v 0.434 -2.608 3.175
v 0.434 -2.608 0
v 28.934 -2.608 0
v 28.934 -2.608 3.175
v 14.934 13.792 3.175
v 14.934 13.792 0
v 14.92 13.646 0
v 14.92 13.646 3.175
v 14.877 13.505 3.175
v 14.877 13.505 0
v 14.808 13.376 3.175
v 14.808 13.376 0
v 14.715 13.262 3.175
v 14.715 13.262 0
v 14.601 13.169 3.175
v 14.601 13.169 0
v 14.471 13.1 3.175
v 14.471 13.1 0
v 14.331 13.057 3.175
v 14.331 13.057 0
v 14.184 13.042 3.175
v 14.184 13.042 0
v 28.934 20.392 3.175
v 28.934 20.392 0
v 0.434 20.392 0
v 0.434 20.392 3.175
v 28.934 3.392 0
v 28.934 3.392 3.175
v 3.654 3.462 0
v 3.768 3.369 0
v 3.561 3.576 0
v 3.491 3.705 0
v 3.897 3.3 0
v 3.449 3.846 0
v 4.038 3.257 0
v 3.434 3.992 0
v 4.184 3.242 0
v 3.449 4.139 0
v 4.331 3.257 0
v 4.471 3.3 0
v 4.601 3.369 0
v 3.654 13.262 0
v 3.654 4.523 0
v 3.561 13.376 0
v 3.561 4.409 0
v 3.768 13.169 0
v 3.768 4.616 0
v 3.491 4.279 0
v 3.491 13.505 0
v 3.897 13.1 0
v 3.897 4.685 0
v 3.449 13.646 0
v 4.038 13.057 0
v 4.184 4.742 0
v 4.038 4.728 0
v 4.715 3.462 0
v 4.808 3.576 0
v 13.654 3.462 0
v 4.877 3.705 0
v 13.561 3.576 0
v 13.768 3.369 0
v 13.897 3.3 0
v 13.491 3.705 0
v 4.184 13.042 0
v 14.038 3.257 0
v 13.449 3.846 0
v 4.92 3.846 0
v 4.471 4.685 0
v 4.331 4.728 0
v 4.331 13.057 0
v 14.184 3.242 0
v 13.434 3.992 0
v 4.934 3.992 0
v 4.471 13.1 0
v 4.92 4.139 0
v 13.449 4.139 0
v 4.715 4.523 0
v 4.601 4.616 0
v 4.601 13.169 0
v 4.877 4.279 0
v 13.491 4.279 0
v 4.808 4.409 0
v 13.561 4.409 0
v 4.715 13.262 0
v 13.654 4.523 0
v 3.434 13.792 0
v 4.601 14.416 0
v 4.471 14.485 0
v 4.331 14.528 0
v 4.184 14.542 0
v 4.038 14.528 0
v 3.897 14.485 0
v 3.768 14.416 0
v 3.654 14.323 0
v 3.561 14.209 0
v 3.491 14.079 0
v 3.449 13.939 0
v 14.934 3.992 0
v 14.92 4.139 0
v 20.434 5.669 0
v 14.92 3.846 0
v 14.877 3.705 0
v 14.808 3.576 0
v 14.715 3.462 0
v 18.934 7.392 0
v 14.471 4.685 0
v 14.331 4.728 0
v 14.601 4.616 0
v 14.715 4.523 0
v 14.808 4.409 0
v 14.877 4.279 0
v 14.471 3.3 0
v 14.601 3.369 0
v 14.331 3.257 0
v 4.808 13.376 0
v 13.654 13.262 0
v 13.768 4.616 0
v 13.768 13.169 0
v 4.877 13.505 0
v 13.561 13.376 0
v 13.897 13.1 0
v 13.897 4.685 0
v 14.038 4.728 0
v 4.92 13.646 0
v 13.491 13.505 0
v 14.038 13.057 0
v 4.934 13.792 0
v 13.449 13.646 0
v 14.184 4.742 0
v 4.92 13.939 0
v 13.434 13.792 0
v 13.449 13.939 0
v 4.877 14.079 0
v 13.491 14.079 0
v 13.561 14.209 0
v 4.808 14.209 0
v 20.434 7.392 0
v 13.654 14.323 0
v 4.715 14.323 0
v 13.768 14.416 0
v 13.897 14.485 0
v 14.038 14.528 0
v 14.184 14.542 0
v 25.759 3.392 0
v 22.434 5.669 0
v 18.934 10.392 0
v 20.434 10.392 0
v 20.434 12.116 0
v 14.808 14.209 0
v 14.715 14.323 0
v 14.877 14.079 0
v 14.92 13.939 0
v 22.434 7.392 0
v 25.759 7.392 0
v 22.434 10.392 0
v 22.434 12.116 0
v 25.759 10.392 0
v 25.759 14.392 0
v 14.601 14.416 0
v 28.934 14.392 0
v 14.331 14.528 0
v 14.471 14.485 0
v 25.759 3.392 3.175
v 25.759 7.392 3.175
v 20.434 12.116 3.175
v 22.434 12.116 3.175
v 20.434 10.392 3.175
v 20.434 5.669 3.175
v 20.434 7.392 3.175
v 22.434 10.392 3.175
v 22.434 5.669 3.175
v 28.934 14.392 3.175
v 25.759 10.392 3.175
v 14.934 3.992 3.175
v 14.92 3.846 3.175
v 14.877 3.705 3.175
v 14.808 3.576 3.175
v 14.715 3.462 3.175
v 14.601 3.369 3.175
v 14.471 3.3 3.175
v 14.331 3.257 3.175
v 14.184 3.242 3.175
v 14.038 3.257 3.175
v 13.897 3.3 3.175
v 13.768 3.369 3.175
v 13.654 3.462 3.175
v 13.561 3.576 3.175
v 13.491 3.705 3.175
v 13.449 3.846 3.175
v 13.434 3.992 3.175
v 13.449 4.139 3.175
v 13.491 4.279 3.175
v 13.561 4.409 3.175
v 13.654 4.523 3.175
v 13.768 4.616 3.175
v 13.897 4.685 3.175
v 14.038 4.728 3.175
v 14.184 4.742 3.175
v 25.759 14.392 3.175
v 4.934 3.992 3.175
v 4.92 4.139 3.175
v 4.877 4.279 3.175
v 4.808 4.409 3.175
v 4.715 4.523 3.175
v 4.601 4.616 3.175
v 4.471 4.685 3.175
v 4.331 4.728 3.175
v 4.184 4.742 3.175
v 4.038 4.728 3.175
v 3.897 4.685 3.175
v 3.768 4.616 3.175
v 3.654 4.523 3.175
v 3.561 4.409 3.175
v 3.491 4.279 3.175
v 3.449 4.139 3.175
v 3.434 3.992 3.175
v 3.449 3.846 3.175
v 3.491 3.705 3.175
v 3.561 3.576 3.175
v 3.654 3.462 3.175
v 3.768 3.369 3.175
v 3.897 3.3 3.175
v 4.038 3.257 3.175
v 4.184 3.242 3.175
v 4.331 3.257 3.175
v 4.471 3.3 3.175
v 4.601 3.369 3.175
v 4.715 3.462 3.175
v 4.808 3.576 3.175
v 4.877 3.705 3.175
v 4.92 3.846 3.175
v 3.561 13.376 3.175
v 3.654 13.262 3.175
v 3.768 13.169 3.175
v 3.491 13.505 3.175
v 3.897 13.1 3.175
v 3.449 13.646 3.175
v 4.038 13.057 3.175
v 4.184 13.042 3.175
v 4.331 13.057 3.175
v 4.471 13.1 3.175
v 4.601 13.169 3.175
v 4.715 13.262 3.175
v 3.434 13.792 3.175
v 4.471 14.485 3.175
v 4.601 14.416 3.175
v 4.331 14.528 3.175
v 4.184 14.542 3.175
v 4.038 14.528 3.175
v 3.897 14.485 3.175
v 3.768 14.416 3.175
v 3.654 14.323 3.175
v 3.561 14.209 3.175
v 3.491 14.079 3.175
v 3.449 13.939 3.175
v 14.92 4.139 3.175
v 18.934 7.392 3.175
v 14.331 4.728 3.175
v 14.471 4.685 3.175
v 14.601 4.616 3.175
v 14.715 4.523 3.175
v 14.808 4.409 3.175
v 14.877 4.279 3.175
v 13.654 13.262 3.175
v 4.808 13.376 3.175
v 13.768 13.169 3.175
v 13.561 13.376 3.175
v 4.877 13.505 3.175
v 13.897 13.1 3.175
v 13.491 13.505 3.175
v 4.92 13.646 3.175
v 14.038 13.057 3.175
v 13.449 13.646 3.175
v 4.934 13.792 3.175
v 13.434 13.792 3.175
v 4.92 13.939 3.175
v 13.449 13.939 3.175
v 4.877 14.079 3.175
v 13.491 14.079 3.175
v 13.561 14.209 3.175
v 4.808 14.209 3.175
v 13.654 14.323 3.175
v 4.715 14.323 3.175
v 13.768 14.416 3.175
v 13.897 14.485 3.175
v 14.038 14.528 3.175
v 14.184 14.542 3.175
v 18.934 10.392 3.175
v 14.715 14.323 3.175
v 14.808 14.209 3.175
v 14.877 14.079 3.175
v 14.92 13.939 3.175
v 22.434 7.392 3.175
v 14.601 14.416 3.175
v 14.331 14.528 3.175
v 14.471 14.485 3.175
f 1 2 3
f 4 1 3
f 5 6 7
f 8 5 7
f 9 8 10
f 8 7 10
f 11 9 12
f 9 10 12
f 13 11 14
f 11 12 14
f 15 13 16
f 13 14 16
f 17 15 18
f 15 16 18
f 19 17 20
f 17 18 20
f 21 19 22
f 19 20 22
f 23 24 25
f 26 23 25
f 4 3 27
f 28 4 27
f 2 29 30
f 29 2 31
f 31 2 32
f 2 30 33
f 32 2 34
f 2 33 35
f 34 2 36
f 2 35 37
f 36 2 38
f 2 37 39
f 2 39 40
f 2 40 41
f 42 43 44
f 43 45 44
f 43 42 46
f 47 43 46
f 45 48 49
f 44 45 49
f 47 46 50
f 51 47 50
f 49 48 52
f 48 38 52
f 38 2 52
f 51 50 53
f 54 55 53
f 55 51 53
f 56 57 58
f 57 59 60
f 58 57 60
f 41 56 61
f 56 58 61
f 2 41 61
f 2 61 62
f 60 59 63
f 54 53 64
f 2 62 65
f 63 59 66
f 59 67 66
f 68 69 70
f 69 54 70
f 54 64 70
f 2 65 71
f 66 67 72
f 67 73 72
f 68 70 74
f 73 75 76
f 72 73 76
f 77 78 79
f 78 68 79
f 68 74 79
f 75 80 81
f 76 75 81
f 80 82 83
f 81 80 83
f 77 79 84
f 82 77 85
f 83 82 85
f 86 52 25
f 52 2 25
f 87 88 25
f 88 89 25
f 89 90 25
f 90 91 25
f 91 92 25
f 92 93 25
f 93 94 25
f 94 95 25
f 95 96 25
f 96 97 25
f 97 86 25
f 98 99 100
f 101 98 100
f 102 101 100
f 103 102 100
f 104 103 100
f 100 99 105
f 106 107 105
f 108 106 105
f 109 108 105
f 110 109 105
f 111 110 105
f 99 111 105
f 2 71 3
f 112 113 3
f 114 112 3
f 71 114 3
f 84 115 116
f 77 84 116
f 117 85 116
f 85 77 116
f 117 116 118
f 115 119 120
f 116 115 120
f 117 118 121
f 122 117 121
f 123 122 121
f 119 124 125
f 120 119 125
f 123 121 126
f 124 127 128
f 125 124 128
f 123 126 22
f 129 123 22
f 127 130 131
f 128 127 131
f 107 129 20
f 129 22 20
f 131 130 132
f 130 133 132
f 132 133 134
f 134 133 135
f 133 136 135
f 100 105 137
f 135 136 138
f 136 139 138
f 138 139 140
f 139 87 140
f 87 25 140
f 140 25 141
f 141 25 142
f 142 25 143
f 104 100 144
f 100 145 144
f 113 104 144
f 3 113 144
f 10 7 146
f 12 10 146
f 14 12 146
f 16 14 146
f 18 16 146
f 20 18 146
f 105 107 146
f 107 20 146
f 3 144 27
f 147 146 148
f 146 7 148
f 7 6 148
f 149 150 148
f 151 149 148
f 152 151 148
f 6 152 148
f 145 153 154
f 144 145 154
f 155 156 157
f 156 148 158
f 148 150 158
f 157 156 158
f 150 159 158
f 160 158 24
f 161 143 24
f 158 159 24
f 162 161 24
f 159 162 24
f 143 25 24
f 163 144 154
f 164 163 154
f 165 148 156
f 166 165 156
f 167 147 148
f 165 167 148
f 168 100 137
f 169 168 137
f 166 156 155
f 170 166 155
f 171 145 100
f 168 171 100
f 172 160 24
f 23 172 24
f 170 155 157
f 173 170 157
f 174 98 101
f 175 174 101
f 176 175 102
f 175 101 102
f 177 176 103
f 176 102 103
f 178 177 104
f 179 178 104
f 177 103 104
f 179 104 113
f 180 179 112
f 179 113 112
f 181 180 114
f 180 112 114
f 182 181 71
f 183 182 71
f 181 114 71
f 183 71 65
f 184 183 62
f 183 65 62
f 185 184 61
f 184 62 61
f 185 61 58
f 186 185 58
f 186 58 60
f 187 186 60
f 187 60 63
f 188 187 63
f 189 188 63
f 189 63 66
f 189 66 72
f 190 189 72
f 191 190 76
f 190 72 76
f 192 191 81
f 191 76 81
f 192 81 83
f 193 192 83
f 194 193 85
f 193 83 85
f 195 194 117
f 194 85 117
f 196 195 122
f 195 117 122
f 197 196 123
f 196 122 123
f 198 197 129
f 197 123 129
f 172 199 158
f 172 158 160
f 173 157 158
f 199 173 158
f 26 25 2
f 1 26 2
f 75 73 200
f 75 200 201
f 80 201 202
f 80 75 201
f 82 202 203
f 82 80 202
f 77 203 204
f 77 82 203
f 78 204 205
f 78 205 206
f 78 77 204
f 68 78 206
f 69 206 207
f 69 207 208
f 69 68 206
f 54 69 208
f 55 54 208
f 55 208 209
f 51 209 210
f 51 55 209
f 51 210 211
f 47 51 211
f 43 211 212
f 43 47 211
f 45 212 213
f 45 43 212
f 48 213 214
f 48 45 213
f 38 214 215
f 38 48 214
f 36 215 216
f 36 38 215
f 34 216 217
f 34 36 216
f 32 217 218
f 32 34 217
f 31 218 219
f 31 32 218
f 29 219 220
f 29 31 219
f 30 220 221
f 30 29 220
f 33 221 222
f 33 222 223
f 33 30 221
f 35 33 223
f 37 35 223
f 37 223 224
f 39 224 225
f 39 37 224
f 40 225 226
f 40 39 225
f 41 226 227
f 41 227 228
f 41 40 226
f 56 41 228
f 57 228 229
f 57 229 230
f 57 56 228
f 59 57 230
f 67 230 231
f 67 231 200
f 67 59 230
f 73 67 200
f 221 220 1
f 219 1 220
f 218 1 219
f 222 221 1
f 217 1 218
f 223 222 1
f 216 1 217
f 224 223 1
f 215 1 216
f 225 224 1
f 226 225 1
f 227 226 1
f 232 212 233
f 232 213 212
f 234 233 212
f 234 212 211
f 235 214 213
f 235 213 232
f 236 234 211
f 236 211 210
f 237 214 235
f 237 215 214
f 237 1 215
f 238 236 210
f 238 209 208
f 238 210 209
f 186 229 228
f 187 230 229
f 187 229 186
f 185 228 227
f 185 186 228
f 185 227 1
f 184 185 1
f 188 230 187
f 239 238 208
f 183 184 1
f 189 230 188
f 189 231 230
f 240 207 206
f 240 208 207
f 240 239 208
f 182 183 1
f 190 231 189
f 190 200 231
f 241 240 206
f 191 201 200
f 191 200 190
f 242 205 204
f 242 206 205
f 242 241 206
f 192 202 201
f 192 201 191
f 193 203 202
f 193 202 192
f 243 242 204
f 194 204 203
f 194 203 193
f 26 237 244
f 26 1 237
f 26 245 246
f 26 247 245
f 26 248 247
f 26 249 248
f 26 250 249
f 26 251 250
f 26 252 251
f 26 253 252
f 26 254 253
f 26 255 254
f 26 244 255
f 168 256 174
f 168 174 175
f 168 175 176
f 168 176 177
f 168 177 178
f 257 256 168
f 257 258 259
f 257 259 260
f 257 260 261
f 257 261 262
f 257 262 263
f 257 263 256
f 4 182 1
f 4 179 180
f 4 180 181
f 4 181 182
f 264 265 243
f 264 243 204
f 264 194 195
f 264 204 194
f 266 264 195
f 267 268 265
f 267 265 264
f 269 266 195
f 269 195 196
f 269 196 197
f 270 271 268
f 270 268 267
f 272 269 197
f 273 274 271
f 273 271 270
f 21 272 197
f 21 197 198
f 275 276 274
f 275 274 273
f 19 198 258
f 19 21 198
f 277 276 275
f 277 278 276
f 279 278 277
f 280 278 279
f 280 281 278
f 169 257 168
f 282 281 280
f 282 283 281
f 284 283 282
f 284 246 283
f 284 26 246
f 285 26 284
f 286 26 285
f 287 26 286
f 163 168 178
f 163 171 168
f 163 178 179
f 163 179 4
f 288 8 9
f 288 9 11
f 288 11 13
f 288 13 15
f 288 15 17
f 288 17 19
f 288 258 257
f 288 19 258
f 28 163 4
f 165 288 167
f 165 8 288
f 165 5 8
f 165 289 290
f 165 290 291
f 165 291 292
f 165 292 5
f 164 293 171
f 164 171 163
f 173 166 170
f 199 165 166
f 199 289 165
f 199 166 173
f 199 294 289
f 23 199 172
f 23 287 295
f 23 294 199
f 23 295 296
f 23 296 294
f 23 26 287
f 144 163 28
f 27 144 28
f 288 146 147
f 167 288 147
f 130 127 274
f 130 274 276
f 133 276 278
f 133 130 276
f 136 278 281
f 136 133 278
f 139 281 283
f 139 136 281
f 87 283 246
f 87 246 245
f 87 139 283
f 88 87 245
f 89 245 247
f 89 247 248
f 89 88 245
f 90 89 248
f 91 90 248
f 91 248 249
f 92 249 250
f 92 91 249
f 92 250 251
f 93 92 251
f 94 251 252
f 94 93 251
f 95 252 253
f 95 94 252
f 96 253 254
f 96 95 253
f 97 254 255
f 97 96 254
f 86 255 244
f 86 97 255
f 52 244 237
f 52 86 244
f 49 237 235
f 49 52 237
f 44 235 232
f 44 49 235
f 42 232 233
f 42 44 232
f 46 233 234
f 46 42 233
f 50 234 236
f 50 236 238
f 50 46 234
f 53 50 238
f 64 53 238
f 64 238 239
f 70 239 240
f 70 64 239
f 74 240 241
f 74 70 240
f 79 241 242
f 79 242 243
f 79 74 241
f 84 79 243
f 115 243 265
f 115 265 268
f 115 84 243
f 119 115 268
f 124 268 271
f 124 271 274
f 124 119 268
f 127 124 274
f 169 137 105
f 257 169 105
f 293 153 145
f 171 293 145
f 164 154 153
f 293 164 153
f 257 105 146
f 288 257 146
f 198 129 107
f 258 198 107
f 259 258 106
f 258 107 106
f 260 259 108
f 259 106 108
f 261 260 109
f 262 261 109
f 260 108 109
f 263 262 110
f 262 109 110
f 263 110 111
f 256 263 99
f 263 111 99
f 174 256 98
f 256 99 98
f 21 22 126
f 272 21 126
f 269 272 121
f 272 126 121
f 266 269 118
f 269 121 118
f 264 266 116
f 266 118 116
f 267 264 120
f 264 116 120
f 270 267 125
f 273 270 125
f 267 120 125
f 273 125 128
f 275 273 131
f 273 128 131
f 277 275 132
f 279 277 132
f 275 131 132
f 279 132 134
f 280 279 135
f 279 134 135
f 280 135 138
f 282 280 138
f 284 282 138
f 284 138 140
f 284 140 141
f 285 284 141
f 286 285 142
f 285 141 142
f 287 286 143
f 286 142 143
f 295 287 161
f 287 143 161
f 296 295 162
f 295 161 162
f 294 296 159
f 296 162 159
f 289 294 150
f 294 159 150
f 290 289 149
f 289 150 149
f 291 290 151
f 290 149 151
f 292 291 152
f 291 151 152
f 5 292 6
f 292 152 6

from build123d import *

# Parameters (mm, degrees)
F0_R     = 0.75
F0_W     = 3.175
F0_H     = 6
F1_DEPTH = 3.175


# Not quite as in the source:
# - a length typed as a fraction of an inch, garbled in the dataset ("3 / 203.2 mm" for 3/8 in), is restored


with BuildPart() as f1:
    # F0 (on Top) → F1 (new body)
    with BuildSketch(Plane.XY):
        Polygon((18.934352152, 7.3924250901), (18.934352152, 10.3924250901), (20.434352152, 10.3924250901), (20.434352152, 12.1162086725), (22.434352152, 12.1162086725), (22.434352152, 10.3924250901), (25.759352152, 10.3924250901), (25.759352152, 14.3924250901), (25.759352152, 20.3924250901), (0.434352152, 20.3924250901), (0.434352152, -2.6075749099), (25.759352152, -2.6075749099), (25.759352152, 3.3924250901), (25.759352152, 7.3924250901), (22.434352152, 7.3924250901), (22.434352152, 5.6686415076), (20.434352152, 5.6686415076), (20.434352152, 7.3924250901), align=None)
        with Locations((4.184352152, 3.9924250901)):
            Circle(F0_R, mode=Mode.SUBTRACT)
        with BuildLine():
            ThreePointArc((14.934352152, 3.9924250901), (13.6540220662, 3.4620950042), (14.184352152, 4.7424250901))
            ThreePointArc((14.184352152, 4.7424250901), (14.7146822379, 4.522755176), (14.934352152, 3.9924250901))
        make_face(mode=Mode.SUBTRACT)
        with Locations((4.184352152, 13.7924250901)):
            Circle(F0_R, mode=Mode.SUBTRACT)
        with BuildLine():
            ThreePointArc((14.184352152, 13.0424250901), (13.6540220662, 14.322755176), (14.934352152, 13.7924250901))
            ThreePointArc((14.934352152, 13.7924250901), (14.7146822379, 13.2620950042), (14.184352152, 13.0424250901))
        make_face(mode=Mode.SUBTRACT)
        with Locations((27.346852152, 17.3924250901)):
            Rectangle(F0_W, F0_H)
        with Locations((27.346852152, 0.3924250901)):
            Rectangle(F0_W, F0_H)
    extrude(amount=F1_DEPTH)


solid = f1.part
